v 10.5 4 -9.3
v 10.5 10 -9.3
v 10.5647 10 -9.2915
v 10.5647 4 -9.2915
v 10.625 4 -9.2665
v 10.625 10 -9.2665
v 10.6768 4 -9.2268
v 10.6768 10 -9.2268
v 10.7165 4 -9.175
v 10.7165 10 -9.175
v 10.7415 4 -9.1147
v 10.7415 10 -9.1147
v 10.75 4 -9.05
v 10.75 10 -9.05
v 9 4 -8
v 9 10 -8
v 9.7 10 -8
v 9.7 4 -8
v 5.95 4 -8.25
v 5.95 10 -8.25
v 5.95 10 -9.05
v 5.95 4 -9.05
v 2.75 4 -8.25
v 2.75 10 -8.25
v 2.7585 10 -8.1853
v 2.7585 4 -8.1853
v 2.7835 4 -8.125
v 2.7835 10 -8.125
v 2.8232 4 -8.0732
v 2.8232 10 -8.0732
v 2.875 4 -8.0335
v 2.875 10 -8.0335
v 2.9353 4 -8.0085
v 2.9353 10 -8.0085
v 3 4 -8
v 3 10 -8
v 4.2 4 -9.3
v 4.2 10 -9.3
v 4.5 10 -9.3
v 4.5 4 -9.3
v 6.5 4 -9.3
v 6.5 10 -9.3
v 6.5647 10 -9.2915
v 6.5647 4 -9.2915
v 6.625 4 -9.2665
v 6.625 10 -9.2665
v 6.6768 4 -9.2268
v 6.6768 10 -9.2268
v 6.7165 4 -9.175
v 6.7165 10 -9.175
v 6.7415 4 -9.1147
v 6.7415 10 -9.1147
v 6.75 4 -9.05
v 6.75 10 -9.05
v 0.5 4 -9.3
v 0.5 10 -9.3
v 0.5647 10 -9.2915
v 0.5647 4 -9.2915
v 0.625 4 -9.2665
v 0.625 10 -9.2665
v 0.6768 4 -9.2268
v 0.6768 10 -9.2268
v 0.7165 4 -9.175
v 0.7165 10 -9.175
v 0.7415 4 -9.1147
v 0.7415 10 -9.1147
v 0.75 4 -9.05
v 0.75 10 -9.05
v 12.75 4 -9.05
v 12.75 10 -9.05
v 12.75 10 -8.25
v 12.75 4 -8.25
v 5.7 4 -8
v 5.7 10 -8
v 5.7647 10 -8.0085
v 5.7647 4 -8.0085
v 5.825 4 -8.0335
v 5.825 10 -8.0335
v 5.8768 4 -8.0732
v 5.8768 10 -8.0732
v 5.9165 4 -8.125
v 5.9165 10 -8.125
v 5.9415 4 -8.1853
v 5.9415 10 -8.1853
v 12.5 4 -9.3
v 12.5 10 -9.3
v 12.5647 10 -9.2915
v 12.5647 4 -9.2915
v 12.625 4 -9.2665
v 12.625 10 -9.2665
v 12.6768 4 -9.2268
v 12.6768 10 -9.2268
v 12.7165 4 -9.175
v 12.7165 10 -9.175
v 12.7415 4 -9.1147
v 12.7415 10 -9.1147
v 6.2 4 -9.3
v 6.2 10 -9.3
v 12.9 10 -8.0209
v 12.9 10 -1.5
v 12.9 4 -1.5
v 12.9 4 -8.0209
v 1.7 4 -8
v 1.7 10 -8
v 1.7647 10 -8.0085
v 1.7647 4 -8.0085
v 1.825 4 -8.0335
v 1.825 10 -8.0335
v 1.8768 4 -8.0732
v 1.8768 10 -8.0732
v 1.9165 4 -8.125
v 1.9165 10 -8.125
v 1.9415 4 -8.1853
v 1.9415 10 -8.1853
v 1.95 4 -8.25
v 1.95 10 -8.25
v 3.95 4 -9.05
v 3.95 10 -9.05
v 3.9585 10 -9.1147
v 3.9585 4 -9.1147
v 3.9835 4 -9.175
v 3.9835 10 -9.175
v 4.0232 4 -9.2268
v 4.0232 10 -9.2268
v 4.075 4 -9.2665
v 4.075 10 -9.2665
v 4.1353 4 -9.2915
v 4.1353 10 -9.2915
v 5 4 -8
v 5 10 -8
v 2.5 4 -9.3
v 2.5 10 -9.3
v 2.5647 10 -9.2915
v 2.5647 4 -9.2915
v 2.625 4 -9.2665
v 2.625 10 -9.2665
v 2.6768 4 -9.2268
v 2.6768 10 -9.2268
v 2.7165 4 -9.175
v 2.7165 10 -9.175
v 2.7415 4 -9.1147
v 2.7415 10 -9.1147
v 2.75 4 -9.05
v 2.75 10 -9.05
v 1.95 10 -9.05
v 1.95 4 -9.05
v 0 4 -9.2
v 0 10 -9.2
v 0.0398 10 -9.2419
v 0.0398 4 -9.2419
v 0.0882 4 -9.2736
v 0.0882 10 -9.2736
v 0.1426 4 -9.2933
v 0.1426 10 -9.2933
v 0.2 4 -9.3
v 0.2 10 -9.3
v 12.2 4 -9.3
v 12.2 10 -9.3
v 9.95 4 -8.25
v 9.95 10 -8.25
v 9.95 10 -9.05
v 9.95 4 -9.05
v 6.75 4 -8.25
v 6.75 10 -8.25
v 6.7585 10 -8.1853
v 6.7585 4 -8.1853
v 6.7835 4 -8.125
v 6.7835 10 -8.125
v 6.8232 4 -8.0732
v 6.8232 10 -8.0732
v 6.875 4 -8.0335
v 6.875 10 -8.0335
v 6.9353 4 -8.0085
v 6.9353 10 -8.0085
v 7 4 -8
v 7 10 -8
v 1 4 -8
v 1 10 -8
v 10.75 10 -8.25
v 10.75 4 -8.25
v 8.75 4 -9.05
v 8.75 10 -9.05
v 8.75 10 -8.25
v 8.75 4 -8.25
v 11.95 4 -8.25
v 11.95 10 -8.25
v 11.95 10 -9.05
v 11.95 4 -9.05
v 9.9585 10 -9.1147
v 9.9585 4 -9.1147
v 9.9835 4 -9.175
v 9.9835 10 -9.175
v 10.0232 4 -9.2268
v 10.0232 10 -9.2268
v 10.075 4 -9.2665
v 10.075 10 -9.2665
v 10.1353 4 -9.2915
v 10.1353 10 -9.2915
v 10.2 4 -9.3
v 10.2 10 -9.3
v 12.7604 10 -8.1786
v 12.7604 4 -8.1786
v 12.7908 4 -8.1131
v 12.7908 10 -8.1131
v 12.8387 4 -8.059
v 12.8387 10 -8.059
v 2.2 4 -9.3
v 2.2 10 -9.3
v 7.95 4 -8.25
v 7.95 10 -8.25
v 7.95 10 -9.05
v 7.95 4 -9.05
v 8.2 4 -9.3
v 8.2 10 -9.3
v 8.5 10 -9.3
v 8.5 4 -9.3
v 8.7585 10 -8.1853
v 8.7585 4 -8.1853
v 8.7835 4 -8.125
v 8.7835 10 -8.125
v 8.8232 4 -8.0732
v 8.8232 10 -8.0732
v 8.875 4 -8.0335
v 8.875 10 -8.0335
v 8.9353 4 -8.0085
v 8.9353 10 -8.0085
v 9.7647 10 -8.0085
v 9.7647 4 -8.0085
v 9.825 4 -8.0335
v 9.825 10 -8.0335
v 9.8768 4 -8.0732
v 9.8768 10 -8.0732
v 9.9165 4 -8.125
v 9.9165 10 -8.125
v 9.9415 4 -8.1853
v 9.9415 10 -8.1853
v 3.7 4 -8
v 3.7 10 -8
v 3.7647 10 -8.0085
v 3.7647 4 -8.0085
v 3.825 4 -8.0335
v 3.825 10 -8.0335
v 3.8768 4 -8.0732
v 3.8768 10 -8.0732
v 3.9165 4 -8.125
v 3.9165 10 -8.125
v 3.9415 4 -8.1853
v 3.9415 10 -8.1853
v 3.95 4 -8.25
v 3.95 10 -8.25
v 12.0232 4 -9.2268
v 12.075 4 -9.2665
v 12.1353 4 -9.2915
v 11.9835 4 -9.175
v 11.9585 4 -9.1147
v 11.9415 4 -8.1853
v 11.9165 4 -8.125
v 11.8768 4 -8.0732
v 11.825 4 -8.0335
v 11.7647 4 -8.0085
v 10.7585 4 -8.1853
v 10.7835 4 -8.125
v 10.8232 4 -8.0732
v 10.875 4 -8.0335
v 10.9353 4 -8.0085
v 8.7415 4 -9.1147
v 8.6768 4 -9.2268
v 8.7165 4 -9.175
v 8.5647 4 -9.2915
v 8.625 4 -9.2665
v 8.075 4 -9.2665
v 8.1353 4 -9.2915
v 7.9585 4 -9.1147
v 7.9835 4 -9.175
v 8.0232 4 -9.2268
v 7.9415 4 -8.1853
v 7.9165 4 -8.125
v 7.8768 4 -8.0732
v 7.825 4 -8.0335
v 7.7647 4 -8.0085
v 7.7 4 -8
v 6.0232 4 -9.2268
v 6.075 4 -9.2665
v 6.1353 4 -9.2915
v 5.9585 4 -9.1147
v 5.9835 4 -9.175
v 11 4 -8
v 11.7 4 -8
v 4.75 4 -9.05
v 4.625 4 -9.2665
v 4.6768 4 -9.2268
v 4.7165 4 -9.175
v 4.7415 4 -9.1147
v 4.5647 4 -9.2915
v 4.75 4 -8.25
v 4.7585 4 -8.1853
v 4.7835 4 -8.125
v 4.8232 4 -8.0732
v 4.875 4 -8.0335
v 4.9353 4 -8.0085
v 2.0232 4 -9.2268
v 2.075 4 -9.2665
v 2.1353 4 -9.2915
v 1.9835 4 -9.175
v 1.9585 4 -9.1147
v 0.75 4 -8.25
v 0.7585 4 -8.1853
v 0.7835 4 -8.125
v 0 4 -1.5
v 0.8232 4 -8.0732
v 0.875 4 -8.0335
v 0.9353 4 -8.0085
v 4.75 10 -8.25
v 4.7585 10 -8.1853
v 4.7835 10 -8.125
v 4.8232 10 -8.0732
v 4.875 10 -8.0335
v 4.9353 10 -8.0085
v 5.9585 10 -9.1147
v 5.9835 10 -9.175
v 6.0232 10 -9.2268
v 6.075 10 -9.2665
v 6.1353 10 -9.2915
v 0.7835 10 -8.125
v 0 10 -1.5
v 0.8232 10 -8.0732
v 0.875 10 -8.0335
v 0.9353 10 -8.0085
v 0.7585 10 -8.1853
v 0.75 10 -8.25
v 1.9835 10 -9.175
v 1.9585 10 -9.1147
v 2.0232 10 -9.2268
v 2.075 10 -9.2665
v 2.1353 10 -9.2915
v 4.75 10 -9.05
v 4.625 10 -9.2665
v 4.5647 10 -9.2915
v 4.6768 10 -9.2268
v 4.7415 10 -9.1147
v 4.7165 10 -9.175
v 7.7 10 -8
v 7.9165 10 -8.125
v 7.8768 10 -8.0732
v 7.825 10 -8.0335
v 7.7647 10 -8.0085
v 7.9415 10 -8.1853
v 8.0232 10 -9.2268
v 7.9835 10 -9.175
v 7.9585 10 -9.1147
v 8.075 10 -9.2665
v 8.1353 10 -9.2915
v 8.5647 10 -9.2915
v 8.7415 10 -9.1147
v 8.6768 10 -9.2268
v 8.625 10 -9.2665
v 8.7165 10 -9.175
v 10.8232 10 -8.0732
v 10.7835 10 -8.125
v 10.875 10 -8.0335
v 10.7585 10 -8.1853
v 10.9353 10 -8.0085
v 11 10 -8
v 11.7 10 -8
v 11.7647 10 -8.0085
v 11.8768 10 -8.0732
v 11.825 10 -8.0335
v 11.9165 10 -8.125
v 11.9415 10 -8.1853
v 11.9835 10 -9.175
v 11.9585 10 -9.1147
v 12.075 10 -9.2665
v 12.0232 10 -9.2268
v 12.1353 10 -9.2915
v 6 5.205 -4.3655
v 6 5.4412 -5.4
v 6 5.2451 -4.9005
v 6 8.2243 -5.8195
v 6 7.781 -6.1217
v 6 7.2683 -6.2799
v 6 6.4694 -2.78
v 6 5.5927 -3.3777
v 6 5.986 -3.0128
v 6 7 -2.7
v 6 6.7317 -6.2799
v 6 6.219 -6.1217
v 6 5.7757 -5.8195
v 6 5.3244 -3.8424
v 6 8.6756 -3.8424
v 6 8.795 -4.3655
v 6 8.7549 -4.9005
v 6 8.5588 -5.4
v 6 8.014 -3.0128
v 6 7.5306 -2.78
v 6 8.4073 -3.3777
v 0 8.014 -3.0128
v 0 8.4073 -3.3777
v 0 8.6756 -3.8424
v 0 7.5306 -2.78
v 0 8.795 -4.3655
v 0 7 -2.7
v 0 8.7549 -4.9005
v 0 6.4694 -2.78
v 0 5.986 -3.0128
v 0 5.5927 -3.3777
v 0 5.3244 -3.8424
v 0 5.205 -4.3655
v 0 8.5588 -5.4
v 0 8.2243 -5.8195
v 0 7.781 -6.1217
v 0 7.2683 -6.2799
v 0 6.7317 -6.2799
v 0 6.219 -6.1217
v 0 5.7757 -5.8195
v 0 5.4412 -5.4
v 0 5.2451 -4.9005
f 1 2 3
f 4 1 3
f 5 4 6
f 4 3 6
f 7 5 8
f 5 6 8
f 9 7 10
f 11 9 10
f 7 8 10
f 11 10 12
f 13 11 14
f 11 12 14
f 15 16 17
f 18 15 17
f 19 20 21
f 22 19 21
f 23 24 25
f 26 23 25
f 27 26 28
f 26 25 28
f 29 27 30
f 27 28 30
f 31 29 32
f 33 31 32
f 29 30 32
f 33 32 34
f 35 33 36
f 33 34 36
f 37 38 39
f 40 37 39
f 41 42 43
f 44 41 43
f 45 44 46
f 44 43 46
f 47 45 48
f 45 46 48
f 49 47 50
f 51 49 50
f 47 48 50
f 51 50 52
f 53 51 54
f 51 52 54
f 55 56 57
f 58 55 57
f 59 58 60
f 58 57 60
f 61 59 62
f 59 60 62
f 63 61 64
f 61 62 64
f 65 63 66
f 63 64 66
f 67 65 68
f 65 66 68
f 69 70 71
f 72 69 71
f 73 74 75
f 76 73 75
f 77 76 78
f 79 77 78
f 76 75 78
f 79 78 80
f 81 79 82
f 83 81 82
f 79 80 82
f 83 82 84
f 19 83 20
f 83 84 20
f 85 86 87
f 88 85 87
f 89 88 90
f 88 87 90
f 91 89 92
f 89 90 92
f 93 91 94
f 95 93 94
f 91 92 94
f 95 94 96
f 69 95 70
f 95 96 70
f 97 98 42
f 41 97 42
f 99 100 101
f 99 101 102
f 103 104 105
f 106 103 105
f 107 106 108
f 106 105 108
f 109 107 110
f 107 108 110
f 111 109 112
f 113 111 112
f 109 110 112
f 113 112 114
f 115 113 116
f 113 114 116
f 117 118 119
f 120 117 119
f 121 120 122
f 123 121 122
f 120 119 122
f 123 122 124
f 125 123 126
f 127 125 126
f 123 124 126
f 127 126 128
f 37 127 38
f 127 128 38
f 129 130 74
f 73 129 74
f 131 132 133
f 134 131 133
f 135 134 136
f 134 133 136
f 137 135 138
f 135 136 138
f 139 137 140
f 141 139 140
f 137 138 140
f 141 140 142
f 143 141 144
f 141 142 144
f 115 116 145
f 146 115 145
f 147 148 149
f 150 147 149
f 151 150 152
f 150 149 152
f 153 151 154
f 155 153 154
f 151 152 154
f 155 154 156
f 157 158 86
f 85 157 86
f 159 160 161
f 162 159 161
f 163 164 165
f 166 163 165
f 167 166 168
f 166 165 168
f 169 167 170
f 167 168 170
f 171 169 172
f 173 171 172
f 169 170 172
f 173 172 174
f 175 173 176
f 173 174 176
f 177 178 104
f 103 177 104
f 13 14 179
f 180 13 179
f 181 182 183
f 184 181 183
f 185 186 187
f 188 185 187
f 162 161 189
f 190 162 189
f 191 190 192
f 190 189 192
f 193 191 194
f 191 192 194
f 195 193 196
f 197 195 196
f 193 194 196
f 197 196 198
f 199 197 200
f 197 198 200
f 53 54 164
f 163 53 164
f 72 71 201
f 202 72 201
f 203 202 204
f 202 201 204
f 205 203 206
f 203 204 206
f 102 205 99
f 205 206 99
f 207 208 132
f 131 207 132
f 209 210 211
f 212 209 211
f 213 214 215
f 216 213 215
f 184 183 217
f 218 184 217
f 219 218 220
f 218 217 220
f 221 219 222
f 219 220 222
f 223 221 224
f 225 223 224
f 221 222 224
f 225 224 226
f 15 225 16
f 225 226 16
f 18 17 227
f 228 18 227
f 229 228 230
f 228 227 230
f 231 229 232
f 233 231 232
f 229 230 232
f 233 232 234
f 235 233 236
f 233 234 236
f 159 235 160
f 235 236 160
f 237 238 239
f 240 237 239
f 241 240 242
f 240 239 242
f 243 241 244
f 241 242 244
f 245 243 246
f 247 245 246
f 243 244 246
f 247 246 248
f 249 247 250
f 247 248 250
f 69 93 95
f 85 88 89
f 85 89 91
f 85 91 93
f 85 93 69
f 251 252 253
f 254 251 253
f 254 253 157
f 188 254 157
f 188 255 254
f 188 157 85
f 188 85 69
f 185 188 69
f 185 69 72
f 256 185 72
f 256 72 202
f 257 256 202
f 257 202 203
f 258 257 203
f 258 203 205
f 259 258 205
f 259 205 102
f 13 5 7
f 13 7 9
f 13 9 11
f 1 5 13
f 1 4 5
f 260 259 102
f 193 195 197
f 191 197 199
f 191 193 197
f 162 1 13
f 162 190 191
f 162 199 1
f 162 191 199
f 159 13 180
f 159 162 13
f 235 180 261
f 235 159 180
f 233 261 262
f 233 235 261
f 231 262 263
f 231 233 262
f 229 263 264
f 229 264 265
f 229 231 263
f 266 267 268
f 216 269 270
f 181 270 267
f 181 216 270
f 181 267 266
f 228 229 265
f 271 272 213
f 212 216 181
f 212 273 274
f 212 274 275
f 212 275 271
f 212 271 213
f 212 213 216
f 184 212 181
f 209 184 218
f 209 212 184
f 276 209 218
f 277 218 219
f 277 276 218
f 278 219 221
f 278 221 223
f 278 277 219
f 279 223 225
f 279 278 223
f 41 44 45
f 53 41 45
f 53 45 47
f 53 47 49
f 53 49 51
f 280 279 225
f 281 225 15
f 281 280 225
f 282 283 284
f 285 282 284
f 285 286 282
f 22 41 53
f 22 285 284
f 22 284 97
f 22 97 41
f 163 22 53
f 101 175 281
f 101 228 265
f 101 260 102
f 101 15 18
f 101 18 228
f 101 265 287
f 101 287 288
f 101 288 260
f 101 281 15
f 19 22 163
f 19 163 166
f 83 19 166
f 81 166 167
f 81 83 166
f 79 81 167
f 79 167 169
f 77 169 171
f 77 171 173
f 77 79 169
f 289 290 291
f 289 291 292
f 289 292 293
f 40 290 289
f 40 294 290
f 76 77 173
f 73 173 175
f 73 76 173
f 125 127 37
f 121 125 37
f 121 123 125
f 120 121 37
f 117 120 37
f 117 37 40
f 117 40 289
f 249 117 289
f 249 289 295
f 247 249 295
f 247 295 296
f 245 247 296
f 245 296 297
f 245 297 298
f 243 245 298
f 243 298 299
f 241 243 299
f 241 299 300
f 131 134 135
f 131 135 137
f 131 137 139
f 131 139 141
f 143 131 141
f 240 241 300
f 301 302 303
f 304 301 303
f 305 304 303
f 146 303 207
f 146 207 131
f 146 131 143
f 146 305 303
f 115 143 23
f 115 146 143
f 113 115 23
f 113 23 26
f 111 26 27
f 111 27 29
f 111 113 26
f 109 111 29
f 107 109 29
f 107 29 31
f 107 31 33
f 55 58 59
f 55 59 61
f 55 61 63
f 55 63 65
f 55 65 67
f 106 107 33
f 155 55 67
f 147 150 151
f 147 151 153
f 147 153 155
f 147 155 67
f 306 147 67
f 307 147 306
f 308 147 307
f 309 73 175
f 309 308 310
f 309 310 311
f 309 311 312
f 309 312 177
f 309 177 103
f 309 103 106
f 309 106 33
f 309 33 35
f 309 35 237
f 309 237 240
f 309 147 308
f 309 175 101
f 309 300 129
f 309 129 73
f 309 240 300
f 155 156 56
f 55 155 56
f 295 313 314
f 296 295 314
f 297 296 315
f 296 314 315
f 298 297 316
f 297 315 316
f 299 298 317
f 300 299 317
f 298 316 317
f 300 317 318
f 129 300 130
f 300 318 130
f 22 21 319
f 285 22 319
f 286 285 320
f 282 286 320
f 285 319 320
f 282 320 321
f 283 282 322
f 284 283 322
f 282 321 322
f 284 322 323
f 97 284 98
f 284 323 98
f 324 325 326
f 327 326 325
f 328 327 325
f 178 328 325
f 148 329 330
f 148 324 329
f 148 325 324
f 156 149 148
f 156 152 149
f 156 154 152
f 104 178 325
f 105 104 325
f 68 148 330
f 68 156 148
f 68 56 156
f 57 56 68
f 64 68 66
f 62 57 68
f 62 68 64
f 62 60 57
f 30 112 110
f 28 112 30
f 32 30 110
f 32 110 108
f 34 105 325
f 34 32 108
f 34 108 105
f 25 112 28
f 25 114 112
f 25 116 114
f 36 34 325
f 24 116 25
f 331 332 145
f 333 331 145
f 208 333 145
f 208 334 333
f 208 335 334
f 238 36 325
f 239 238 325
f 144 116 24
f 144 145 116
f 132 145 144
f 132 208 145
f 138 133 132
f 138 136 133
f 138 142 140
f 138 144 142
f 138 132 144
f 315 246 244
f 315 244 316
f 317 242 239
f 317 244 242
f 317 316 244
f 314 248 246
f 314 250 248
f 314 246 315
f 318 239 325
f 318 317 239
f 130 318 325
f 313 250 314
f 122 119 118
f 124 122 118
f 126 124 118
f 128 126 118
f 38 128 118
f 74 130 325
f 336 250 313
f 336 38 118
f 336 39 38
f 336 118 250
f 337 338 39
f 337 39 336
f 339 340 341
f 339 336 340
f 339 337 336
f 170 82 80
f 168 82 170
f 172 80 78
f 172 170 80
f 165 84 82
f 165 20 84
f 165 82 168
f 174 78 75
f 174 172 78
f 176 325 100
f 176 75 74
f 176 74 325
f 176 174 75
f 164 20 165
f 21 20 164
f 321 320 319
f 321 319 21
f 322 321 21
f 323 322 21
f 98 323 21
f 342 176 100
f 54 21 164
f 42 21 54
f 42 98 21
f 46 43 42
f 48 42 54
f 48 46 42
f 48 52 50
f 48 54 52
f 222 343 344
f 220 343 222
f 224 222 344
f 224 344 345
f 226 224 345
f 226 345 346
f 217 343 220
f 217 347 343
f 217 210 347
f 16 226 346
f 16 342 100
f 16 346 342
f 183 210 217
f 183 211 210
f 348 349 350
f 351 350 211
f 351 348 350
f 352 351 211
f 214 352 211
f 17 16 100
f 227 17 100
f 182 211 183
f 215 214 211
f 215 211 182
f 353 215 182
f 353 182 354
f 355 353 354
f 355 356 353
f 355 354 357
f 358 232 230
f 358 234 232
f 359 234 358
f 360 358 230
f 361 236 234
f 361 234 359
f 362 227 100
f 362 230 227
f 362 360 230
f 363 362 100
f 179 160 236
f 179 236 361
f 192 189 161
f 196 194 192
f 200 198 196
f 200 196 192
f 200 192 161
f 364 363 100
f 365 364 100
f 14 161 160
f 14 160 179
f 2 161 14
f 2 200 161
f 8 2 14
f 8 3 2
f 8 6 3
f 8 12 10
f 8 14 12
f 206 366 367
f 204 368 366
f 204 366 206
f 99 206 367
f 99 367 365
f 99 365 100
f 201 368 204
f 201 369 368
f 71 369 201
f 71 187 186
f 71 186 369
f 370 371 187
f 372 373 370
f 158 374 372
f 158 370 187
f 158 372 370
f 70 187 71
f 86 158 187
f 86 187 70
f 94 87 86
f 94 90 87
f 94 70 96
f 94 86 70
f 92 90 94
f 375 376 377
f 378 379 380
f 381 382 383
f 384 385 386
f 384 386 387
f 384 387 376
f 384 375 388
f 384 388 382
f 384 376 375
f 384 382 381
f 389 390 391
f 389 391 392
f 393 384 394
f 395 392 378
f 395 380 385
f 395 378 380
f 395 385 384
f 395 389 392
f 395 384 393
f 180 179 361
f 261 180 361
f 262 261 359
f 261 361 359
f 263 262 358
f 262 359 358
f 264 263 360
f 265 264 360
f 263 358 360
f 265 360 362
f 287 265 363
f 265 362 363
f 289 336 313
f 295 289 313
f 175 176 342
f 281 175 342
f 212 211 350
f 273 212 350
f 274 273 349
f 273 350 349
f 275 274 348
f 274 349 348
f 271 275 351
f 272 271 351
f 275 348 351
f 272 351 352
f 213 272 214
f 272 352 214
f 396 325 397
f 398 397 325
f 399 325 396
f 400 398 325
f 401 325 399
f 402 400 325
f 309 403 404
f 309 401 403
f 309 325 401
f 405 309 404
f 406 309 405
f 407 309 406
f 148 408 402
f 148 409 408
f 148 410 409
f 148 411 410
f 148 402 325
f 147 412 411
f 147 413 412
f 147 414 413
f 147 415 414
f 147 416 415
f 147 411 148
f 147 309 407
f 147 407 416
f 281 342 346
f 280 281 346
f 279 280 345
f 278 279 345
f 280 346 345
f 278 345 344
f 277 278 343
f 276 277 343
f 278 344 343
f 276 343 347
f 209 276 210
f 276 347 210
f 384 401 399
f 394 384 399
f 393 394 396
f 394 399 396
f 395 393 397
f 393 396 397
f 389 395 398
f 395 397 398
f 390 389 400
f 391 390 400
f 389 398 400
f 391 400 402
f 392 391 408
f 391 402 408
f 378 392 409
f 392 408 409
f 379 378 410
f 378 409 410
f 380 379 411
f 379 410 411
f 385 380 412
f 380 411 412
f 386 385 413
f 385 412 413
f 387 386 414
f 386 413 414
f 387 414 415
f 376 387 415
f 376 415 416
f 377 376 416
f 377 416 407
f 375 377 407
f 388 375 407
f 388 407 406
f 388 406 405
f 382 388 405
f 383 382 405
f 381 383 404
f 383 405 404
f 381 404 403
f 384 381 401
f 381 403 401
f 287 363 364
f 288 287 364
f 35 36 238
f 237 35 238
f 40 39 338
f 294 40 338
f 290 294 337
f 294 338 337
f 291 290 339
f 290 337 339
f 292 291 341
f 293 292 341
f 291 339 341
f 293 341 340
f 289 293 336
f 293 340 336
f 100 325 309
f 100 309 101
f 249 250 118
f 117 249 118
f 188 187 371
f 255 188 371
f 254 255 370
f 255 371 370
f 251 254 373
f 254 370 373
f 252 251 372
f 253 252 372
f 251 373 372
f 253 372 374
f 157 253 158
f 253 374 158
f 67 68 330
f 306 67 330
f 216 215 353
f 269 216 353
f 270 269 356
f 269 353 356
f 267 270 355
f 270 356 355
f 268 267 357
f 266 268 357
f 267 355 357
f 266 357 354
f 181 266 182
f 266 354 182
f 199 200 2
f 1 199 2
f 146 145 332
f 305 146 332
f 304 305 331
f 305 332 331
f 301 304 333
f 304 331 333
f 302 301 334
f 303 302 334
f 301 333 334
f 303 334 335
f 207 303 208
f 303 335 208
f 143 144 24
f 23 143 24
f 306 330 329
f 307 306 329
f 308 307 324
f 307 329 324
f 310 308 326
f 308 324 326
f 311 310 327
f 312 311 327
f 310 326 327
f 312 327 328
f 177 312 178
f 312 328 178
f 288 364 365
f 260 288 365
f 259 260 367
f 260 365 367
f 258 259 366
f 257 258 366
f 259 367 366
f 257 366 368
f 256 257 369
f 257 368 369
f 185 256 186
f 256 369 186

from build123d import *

# Parameters (mm, degrees)
SKETCH_1_W           = 45
SKETCH_1_H           = 26
EXTRUDE_1_DEPTH      = 10
CUT_EXTRUDE_1_DEPTH  = 6
SKETCH_4_W           = 30
SKETCH_4_H           = 1.4
CUT_EXTRUDE_3_DEPTH  = 6
SKETCH_5_R           = 1.8
CUT_EXTRUDE_4_DEPTH  = 30
SKETCH_6_W           = 2.8
SKETCH_6_H           = 6
CUT_EXTRUDE_5_DEPTH  = 6.5
SKETCH_7_W           = 22.3
SKETCH_7_H           = 8.113029467
CUT_EXTRUDE_7_DEPTH  = 6
SKETCH_8_R           = 1.9
CUT_EXTRUDE_8_DEPTH  = 15.9
SKETCH_10_W          = 6
SKETCH_10_H          = 3
CUT_EXTRUDE_9_DEPTH  = 8.5
SKETCH_12_W          = 10.2
SKETCH_12_H          = 4
CUT_EXTRUDE_11_DEPTH = 45
SKETCH_13_W          = 12.9
SKETCH_13_H          = 1.5
CUT_EXTRUDE_12_DEPTH = 6
SKETCH_14_R          = 1.8
CUT_EXTRUDE_13_DEPTH = 6


with BuildPart() as part:
    # 草图1 → 凸台-拉伸1 (new body)
    with BuildSketch(Plane(origin=(0, 0, 0), x_dir=(1, 0, 0), z_dir=(0, 1, 0))):
        with Locations((22.5, 13)):
            Rectangle(SKETCH_1_W, SKETCH_1_H)
    extrude(amount=EXTRUDE_1_DEPTH)

    # 草图3 → 切除-拉伸1 (cut)
    with BuildSketch(Plane(origin=(0, 10, 0), x_dir=(1, 0, 0), z_dir=(0, 1, 0))):
        with BuildLine():
            Line((43, 8), (43.7, 8))
            ThreePointArc((43.7, 8), (43.876776695, 8.073223305), (43.95, 8.25))
            Line((43.95, 8.25), (43.95, 9.05))
            ThreePointArc((43.95, 9.05), (44.023223305, 9.226776695), (44.2, 9.3))
            Line((44.2, 9.3), (44.5, 9.3))
            ThreePointArc((44.5, 9.3), (44.676776695, 9.226776695), (44.75, 9.05))
            Line((44.75, 9.05), (44.75, 8.25))
            ThreePointArc((44.75, 8.25), (44.823223305, 8.073223305), (45, 8))
            Line((45, 8), (45, 10.2))
            Line((45, 10.2), (0, 10.2))
            Line((0, 10.2), (0, 9.2))
            ThreePointArc((0, 9.2), (0.088196601, 9.273606798), (0.2, 9.3))
            Line((0.2, 9.3), (0.5, 9.3))
            ThreePointArc((0.5, 9.3), (0.676776695, 9.226776695), (0.75, 9.05))
            Line((0.75, 9.05), (0.75, 8.25))
            ThreePointArc((0.75, 8.25), (0.823223305, 8.073223305), (1, 8))
            Line((1, 8), (1.7, 8))
            ThreePointArc((1.7, 8), (1.876776695, 8.073223305), (1.95, 8.25))
            Line((1.95, 8.25), (1.95, 9.05))
            ThreePointArc((1.95, 9.05), (2.023223305, 9.226776695), (2.2, 9.3))
            Line((2.2, 9.3), (2.5, 9.3))
            ThreePointArc((2.5, 9.3), (2.676776695, 9.226776695), (2.75, 9.05))
            Line((2.75, 9.05), (2.75, 8.25))
            ThreePointArc((2.75, 8.25), (2.823223305, 8.073223305), (3, 8))
            Line((3, 8), (3.7, 8))
            ThreePointArc((3.7, 8), (3.876776695, 8.073223305), (3.95, 8.25))
            Line((3.95, 8.25), (3.95, 9.05))
            ThreePointArc((3.95, 9.05), (4.023223305, 9.226776695), (4.2, 9.3))
            Line((4.2, 9.3), (4.5, 9.3))
            ThreePointArc((4.5, 9.3), (4.676776695, 9.226776695), (4.75, 9.05))
            Line((4.75, 9.05), (4.75, 8.25))
            ThreePointArc((4.75, 8.25), (4.823223305, 8.073223305), (5, 8))
            Line((5, 8), (5.7, 8))
            ThreePointArc((5.7, 8), (5.876776695, 8.073223305), (5.95, 8.25))
            Line((5.95, 8.25), (5.95, 9.05))
            ThreePointArc((5.95, 9.05), (6.023223305, 9.226776695), (6.2, 9.3))
            Line((6.2, 9.3), (6.5, 9.3))
            ThreePointArc((6.5, 9.3), (6.676776695, 9.226776695), (6.75, 9.05))
            Line((6.75, 9.05), (6.75, 8.25))
            ThreePointArc((6.75, 8.25), (6.823223305, 8.073223305), (7, 8))
            Line((7, 8), (7.7, 8))
            ThreePointArc((7.7, 8), (7.876776695, 8.073223305), (7.95, 8.25))
            Line((7.95, 8.25), (7.95, 9.05))
            ThreePointArc((7.95, 9.05), (8.023223305, 9.226776695), (8.2, 9.3))
            Line((8.2, 9.3), (8.5, 9.3))
            ThreePointArc((8.5, 9.3), (8.676776695, 9.226776695), (8.75, 9.05))
            Line((8.75, 9.05), (8.75, 8.25))
            ThreePointArc((8.75, 8.25), (8.823223305, 8.073223305), (9, 8))
            Line((9, 8), (9.7, 8))
            ThreePointArc((9.7, 8), (9.876776695, 8.073223305), (9.95, 8.25))
            Line((9.95, 8.25), (9.95, 9.05))
            ThreePointArc((9.95, 9.05), (10.023223305, 9.226776695), (10.2, 9.3))
            Line((10.2, 9.3), (10.5, 9.3))
            ThreePointArc((10.5, 9.3), (10.676776695, 9.226776695), (10.75, 9.05))
            Line((10.75, 9.05), (10.75, 8.25))
            ThreePointArc((10.75, 8.25), (10.823223305, 8.073223305), (11, 8))
            Line((11, 8), (11.7, 8))
            ThreePointArc((11.7, 8), (11.876776695, 8.073223305), (11.95, 8.25))
            Line((11.95, 8.25), (11.95, 9.05))
            ThreePointArc((11.95, 9.05), (12.023223305, 9.226776695), (12.2, 9.3))
            Line((12.2, 9.3), (12.5, 9.3))
            ThreePointArc((12.5, 9.3), (12.676776695, 9.226776695), (12.75, 9.05))
            Line((12.75, 9.05), (12.75, 8.25))
            ThreePointArc((12.75, 8.25), (12.823223305, 8.073223305), (13, 8))
            Line((13, 8), (13.7, 8))
            ThreePointArc((13.7, 8), (13.876776695, 8.073223305), (13.95, 8.25))
            Line((13.95, 8.25), (13.95, 9.05))
            ThreePointArc((13.95, 9.05), (14.023223305, 9.226776695), (14.2, 9.3))
            Line((14.2, 9.3), (14.5, 9.3))
            ThreePointArc((14.5, 9.3), (14.676776695, 9.226776695), (14.75, 9.05))
            Line((14.75, 9.05), (14.75, 8.25))
            ThreePointArc((14.75, 8.25), (14.823223305, 8.073223305), (15, 8))
            Line((15, 8), (15.7, 8))
            ThreePointArc((15.7, 8), (15.876776695, 8.073223305), (15.95, 8.25))
            Line((15.95, 8.25), (15.95, 9.05))
            ThreePointArc((15.95, 9.05), (16.023223305, 9.226776695), (16.2, 9.3))
            Line((16.2, 9.3), (16.5, 9.3))
            ThreePointArc((16.5, 9.3), (16.676776695, 9.226776695), (16.75, 9.05))
            Line((16.75, 9.05), (16.75, 8.25))
            ThreePointArc((16.75, 8.25), (16.823223305, 8.073223305), (17, 8))
            Line((17, 8), (17.7, 8))
            ThreePointArc((17.7, 8), (17.876776695, 8.073223305), (17.95, 8.25))
            Line((17.95, 8.25), (17.95, 9.05))
            ThreePointArc((17.95, 9.05), (18.023223305, 9.226776695), (18.2, 9.3))
            Line((18.2, 9.3), (18.5, 9.3))
            ThreePointArc((18.5, 9.3), (18.676776695, 9.226776695), (18.75, 9.05))
            Line((18.75, 9.05), (18.75, 8.25))
            ThreePointArc((18.75, 8.25), (18.823223305, 8.073223305), (19, 8))
            Line((19, 8), (19.7, 8))
            ThreePointArc((19.7, 8), (19.876776695, 8.073223305), (19.95, 8.25))
            Line((19.95, 8.25), (19.95, 9.05))
            ThreePointArc((19.95, 9.05), (20.023223305, 9.226776695), (20.2, 9.3))
            Line((20.2, 9.3), (20.5, 9.3))
            ThreePointArc((20.5, 9.3), (20.676776695, 9.226776695), (20.75, 9.05))
            Line((20.75, 9.05), (20.75, 8.25))
            ThreePointArc((20.75, 8.25), (20.823223305, 8.073223305), (21, 8))
            Line((21, 8), (21.7, 8))
            ThreePointArc((21.7, 8), (21.876776695, 8.073223305), (21.95, 8.25))
            Line((21.95, 8.25), (21.95, 9.05))
            ThreePointArc((21.95, 9.05), (22.023223305, 9.226776695), (22.2, 9.3))
            Line((22.2, 9.3), (22.5, 9.3))
            ThreePointArc((22.5, 9.3), (22.676776695, 9.226776695), (22.75, 9.05))
            Line((22.75, 9.05), (22.75, 8.25))
            ThreePointArc((22.75, 8.25), (22.823223305, 8.073223305), (23, 8))
            Line((23, 8), (23.7, 8))
            ThreePointArc((23.7, 8), (23.876776695, 8.073223305), (23.95, 8.25))
            Line((23.95, 8.25), (23.95, 9.05))
            ThreePointArc((23.95, 9.05), (24.023223305, 9.226776695), (24.2, 9.3))
            Line((24.2, 9.3), (24.5, 9.3))
            ThreePointArc((24.5, 9.3), (24.676776695, 9.226776695), (24.75, 9.05))
            Line((24.75, 9.05), (24.75, 8.25))
            ThreePointArc((24.75, 8.25), (24.823223305, 8.073223305), (25, 8))
            Line((25, 8), (25.7, 8))
            ThreePointArc((25.7, 8), (25.876776695, 8.073223305), (25.95, 8.25))
            Line((25.95, 8.25), (25.95, 9.05))
            ThreePointArc((25.95, 9.05), (26.023223305, 9.226776695), (26.2, 9.3))
            Line((26.2, 9.3), (26.5, 9.3))
            ThreePointArc((26.5, 9.3), (26.676776695, 9.226776695), (26.75, 9.05))
            Line((26.75, 9.05), (26.75, 8.25))
            ThreePointArc((26.75, 8.25), (26.823223305, 8.073223305), (27, 8))
            Line((27, 8), (27.7, 8))
            ThreePointArc((27.7, 8), (27.876776695, 8.073223305), (27.95, 8.25))
            Line((27.95, 8.25), (27.95, 9.05))
            ThreePointArc((27.95, 9.05), (28.023223305, 9.226776695), (28.2, 9.3))
            Line((28.2, 9.3), (28.5, 9.3))
            ThreePointArc((28.5, 9.3), (28.676776695, 9.226776695), (28.75, 9.05))
            Line((28.75, 9.05), (28.75, 8.25))
            ThreePointArc((28.75, 8.25), (28.823223305, 8.073223305), (29, 8))
            Line((29, 8), (29.7, 8))
            ThreePointArc((29.7, 8), (29.876776695, 8.073223305), (29.95, 8.25))
            Line((29.95, 8.25), (29.95, 9.05))
            ThreePointArc((29.95, 9.05), (30.023223305, 9.226776695), (30.2, 9.3))
            Line((30.2, 9.3), (30.5, 9.3))
            ThreePointArc((30.5, 9.3), (30.676776695, 9.226776695), (30.75, 9.05))
            Line((30.75, 9.05), (30.75, 8.25))
            ThreePointArc((30.75, 8.25), (30.823223305, 8.073223305), (31, 8))
            Line((31, 8), (31.7, 8))
            ThreePointArc((31.7, 8), (31.876776695, 8.073223305), (31.95, 8.25))
            Line((31.95, 8.25), (31.95, 9.05))
            ThreePointArc((31.95, 9.05), (32.023223305, 9.226776695), (32.2, 9.3))
            Line((32.2, 9.3), (32.5, 9.3))
            ThreePointArc((32.5, 9.3), (32.676776695, 9.226776695), (32.75, 9.05))
            Line((32.75, 9.05), (32.75, 8.25))
            ThreePointArc((32.75, 8.25), (32.823223305, 8.073223305), (33, 8))
            Line((33, 8), (33.7, 8))
            ThreePointArc((33.7, 8), (33.876776695, 8.073223305), (33.95, 8.25))
            Line((33.95, 8.25), (33.95, 9.05))
            ThreePointArc((33.95, 9.05), (34.023223305, 9.226776695), (34.2, 9.3))
            Line((34.2, 9.3), (34.5, 9.3))
            ThreePointArc((34.5, 9.3), (34.676776695, 9.226776695), (34.75, 9.05))
            Line((34.75, 9.05), (34.75, 8.25))
            ThreePointArc((34.75, 8.25), (34.823223305, 8.073223305), (35, 8))
            Line((35, 8), (35.7, 8))
            ThreePointArc((35.7, 8), (35.876776695, 8.073223305), (35.95, 8.25))
            Line((35.95, 8.25), (35.95, 9.05))
            ThreePointArc((35.95, 9.05), (36.023223305, 9.226776695), (36.2, 9.3))
            Line((36.2, 9.3), (36.5, 9.3))
            ThreePointArc((36.5, 9.3), (36.676776695, 9.226776695), (36.75, 9.05))
            Line((36.75, 9.05), (36.75, 8.25))
            ThreePointArc((36.75, 8.25), (36.823223305, 8.073223305), (37, 8))
            Line((37, 8), (37.7, 8))
            ThreePointArc((37.7, 8), (37.876776695, 8.073223305), (37.95, 8.25))
            Line((37.95, 8.25), (37.95, 9.05))
            ThreePointArc((37.95, 9.05), (38.023223305, 9.226776695), (38.2, 9.3))
            Line((38.2, 9.3), (38.5, 9.3))
            ThreePointArc((38.5, 9.3), (38.676776695, 9.226776695), (38.75, 9.05))
            Line((38.75, 9.05), (38.75, 8.25))
            ThreePointArc((38.75, 8.25), (38.823223305, 8.073223305), (39, 8))
            Line((39, 8), (39.7, 8))
            ThreePointArc((39.7, 8), (39.876776695, 8.073223305), (39.95, 8.25))
            Line((39.95, 8.25), (39.95, 9.05))
            ThreePointArc((39.95, 9.05), (40.023223305, 9.226776695), (40.2, 9.3))
            Line((40.2, 9.3), (40.5, 9.3))
            ThreePointArc((40.5, 9.3), (40.676776695, 9.226776695), (40.75, 9.05))
            Line((40.75, 9.05), (40.75, 8.25))
            ThreePointArc((40.75, 8.25), (40.823223305, 8.073223305), (41, 8))
            Line((41, 8), (41.7, 8))
            ThreePointArc((41.7, 8), (41.876776695, 8.073223305), (41.95, 8.25))
            Line((41.95, 8.25), (41.95, 9.05))
            ThreePointArc((41.95, 9.05), (42.023223305, 9.226776695), (42.2, 9.3))
            Line((42.2, 9.3), (42.5, 9.3))
            ThreePointArc((42.5, 9.3), (42.676776695, 9.226776695), (42.75, 9.05))
            Line((42.75, 9.05), (42.75, 8.25))
            ThreePointArc((42.75, 8.25), (42.823223305, 8.073223305), (43, 8))
        make_face()
    extrude(amount=-CUT_EXTRUDE_1_DEPTH, mode=Mode.SUBTRACT)

    # 草图4 → 切除-拉伸3 (cut)
    with BuildSketch(Plane(origin=(0, 10, 0), x_dir=(1, 0, 0), z_dir=(0, 1, 0))):
        with Locations((30, 8.7)):
            Rectangle(SKETCH_4_W, SKETCH_4_H)
    extrude(amount=-CUT_EXTRUDE_3_DEPTH, mode=Mode.SUBTRACT)

    # 草图5 → 切除-拉伸4 (cut)
    with BuildSketch(Plane(origin=(45, 0, 0), x_dir=(0, 0, -1), z_dir=(1, 0, 0))):
        with Locations((4.5, 7)):
            Circle(SKETCH_5_R)
    extrude(amount=-CUT_EXTRUDE_4_DEPTH, mode=Mode.SUBTRACT)

    # 草图6 → 切除-拉伸5 (cut)
    with BuildSketch(Plane(origin=(0, 10, 0), x_dir=(1, 0, 0), z_dir=(0, 1, 0))):
        with Locations((38.6, 4.5)):
            Rectangle(SKETCH_6_W, SKETCH_6_H)
    extrude(amount=-CUT_EXTRUDE_5_DEPTH, mode=Mode.SUBTRACT)

    # 草图7 → 切除-拉伸7 (cut)
    with BuildSketch(Plane(origin=(0, 10, 0), x_dir=(1, 0, 0), z_dir=(0, 1, 0))):
        with Locations((24.05, 5.556514734)):
            Rectangle(SKETCH_7_W, SKETCH_7_H)
    extrude(amount=-CUT_EXTRUDE_7_DEPTH, mode=Mode.SUBTRACT)

    # 草图8 → 切除-拉伸8 (cut)
    with BuildSketch(Plane(origin=(0, 0, -26), x_dir=(-1, 0, 0), z_dir=(0, 0, -1))):
        with Locations((-10, 5)):
            Circle(SKETCH_8_R)
        with Locations(Location((-35, 5, 0), (0, 0, 328.243136141))):
            Circle(SKETCH_8_R)
    extrude(amount=-CUT_EXTRUDE_8_DEPTH, mode=Mode.SUBTRACT)

    # 草图10 → 切除-拉伸9 (cut)
    with BuildSketch(Plane(origin=(0, 10, 0), x_dir=(1, 0, 0), z_dir=(0, 1, 0))):
        with Locations((10, 21.5)):
            Rectangle(SKETCH_10_W, SKETCH_10_H)
        with Locations((35, 21.5)):
            Rectangle(SKETCH_10_W, SKETCH_10_H)
    extrude(amount=-CUT_EXTRUDE_9_DEPTH, mode=Mode.SUBTRACT)

    # 草图12 → 切除-拉伸11 (cut)
    with BuildSketch(Plane.ZY):
        with Locations((-5.1, 2)):
            Rectangle(SKETCH_12_W, SKETCH_12_H)
    extrude(amount=-CUT_EXTRUDE_11_DEPTH, mode=Mode.SUBTRACT)


with BuildPart() as body_2:
    # of the pieces the cut leaves, the one that is kept (cut_extrude_11_keep)
    add(part.part.solids().sort_by_distance((0, 4, 0))[0])

    # 草图13 → 切除-拉伸12 (cut)
    with BuildSketch(Plane(origin=(0, 10, 0), x_dir=(1, 0, 0), z_dir=(0, 1, 0))):
        with Locations((6.45, 0.75)):
            Rectangle(SKETCH_13_W, SKETCH_13_H)
    extrude(amount=-CUT_EXTRUDE_12_DEPTH, mode=Mode.SUBTRACT)


with BuildPart() as body_2_2:
    # of the pieces the cut leaves, the one that is kept (cut_extrude_12_keep)
    add(body_2.part.solids().sort_by_distance((0, 4, -9.2))[0])

    # 草图14 → 切除-拉伸13 (cut)
    with BuildSketch(Plane.ZY):
        with Locations((-4.5, 7)):
            Circle(SKETCH_14_R)
    extrude(amount=-CUT_EXTRUDE_13_DEPTH, mode=Mode.SUBTRACT)


solid = body_2_2.part
